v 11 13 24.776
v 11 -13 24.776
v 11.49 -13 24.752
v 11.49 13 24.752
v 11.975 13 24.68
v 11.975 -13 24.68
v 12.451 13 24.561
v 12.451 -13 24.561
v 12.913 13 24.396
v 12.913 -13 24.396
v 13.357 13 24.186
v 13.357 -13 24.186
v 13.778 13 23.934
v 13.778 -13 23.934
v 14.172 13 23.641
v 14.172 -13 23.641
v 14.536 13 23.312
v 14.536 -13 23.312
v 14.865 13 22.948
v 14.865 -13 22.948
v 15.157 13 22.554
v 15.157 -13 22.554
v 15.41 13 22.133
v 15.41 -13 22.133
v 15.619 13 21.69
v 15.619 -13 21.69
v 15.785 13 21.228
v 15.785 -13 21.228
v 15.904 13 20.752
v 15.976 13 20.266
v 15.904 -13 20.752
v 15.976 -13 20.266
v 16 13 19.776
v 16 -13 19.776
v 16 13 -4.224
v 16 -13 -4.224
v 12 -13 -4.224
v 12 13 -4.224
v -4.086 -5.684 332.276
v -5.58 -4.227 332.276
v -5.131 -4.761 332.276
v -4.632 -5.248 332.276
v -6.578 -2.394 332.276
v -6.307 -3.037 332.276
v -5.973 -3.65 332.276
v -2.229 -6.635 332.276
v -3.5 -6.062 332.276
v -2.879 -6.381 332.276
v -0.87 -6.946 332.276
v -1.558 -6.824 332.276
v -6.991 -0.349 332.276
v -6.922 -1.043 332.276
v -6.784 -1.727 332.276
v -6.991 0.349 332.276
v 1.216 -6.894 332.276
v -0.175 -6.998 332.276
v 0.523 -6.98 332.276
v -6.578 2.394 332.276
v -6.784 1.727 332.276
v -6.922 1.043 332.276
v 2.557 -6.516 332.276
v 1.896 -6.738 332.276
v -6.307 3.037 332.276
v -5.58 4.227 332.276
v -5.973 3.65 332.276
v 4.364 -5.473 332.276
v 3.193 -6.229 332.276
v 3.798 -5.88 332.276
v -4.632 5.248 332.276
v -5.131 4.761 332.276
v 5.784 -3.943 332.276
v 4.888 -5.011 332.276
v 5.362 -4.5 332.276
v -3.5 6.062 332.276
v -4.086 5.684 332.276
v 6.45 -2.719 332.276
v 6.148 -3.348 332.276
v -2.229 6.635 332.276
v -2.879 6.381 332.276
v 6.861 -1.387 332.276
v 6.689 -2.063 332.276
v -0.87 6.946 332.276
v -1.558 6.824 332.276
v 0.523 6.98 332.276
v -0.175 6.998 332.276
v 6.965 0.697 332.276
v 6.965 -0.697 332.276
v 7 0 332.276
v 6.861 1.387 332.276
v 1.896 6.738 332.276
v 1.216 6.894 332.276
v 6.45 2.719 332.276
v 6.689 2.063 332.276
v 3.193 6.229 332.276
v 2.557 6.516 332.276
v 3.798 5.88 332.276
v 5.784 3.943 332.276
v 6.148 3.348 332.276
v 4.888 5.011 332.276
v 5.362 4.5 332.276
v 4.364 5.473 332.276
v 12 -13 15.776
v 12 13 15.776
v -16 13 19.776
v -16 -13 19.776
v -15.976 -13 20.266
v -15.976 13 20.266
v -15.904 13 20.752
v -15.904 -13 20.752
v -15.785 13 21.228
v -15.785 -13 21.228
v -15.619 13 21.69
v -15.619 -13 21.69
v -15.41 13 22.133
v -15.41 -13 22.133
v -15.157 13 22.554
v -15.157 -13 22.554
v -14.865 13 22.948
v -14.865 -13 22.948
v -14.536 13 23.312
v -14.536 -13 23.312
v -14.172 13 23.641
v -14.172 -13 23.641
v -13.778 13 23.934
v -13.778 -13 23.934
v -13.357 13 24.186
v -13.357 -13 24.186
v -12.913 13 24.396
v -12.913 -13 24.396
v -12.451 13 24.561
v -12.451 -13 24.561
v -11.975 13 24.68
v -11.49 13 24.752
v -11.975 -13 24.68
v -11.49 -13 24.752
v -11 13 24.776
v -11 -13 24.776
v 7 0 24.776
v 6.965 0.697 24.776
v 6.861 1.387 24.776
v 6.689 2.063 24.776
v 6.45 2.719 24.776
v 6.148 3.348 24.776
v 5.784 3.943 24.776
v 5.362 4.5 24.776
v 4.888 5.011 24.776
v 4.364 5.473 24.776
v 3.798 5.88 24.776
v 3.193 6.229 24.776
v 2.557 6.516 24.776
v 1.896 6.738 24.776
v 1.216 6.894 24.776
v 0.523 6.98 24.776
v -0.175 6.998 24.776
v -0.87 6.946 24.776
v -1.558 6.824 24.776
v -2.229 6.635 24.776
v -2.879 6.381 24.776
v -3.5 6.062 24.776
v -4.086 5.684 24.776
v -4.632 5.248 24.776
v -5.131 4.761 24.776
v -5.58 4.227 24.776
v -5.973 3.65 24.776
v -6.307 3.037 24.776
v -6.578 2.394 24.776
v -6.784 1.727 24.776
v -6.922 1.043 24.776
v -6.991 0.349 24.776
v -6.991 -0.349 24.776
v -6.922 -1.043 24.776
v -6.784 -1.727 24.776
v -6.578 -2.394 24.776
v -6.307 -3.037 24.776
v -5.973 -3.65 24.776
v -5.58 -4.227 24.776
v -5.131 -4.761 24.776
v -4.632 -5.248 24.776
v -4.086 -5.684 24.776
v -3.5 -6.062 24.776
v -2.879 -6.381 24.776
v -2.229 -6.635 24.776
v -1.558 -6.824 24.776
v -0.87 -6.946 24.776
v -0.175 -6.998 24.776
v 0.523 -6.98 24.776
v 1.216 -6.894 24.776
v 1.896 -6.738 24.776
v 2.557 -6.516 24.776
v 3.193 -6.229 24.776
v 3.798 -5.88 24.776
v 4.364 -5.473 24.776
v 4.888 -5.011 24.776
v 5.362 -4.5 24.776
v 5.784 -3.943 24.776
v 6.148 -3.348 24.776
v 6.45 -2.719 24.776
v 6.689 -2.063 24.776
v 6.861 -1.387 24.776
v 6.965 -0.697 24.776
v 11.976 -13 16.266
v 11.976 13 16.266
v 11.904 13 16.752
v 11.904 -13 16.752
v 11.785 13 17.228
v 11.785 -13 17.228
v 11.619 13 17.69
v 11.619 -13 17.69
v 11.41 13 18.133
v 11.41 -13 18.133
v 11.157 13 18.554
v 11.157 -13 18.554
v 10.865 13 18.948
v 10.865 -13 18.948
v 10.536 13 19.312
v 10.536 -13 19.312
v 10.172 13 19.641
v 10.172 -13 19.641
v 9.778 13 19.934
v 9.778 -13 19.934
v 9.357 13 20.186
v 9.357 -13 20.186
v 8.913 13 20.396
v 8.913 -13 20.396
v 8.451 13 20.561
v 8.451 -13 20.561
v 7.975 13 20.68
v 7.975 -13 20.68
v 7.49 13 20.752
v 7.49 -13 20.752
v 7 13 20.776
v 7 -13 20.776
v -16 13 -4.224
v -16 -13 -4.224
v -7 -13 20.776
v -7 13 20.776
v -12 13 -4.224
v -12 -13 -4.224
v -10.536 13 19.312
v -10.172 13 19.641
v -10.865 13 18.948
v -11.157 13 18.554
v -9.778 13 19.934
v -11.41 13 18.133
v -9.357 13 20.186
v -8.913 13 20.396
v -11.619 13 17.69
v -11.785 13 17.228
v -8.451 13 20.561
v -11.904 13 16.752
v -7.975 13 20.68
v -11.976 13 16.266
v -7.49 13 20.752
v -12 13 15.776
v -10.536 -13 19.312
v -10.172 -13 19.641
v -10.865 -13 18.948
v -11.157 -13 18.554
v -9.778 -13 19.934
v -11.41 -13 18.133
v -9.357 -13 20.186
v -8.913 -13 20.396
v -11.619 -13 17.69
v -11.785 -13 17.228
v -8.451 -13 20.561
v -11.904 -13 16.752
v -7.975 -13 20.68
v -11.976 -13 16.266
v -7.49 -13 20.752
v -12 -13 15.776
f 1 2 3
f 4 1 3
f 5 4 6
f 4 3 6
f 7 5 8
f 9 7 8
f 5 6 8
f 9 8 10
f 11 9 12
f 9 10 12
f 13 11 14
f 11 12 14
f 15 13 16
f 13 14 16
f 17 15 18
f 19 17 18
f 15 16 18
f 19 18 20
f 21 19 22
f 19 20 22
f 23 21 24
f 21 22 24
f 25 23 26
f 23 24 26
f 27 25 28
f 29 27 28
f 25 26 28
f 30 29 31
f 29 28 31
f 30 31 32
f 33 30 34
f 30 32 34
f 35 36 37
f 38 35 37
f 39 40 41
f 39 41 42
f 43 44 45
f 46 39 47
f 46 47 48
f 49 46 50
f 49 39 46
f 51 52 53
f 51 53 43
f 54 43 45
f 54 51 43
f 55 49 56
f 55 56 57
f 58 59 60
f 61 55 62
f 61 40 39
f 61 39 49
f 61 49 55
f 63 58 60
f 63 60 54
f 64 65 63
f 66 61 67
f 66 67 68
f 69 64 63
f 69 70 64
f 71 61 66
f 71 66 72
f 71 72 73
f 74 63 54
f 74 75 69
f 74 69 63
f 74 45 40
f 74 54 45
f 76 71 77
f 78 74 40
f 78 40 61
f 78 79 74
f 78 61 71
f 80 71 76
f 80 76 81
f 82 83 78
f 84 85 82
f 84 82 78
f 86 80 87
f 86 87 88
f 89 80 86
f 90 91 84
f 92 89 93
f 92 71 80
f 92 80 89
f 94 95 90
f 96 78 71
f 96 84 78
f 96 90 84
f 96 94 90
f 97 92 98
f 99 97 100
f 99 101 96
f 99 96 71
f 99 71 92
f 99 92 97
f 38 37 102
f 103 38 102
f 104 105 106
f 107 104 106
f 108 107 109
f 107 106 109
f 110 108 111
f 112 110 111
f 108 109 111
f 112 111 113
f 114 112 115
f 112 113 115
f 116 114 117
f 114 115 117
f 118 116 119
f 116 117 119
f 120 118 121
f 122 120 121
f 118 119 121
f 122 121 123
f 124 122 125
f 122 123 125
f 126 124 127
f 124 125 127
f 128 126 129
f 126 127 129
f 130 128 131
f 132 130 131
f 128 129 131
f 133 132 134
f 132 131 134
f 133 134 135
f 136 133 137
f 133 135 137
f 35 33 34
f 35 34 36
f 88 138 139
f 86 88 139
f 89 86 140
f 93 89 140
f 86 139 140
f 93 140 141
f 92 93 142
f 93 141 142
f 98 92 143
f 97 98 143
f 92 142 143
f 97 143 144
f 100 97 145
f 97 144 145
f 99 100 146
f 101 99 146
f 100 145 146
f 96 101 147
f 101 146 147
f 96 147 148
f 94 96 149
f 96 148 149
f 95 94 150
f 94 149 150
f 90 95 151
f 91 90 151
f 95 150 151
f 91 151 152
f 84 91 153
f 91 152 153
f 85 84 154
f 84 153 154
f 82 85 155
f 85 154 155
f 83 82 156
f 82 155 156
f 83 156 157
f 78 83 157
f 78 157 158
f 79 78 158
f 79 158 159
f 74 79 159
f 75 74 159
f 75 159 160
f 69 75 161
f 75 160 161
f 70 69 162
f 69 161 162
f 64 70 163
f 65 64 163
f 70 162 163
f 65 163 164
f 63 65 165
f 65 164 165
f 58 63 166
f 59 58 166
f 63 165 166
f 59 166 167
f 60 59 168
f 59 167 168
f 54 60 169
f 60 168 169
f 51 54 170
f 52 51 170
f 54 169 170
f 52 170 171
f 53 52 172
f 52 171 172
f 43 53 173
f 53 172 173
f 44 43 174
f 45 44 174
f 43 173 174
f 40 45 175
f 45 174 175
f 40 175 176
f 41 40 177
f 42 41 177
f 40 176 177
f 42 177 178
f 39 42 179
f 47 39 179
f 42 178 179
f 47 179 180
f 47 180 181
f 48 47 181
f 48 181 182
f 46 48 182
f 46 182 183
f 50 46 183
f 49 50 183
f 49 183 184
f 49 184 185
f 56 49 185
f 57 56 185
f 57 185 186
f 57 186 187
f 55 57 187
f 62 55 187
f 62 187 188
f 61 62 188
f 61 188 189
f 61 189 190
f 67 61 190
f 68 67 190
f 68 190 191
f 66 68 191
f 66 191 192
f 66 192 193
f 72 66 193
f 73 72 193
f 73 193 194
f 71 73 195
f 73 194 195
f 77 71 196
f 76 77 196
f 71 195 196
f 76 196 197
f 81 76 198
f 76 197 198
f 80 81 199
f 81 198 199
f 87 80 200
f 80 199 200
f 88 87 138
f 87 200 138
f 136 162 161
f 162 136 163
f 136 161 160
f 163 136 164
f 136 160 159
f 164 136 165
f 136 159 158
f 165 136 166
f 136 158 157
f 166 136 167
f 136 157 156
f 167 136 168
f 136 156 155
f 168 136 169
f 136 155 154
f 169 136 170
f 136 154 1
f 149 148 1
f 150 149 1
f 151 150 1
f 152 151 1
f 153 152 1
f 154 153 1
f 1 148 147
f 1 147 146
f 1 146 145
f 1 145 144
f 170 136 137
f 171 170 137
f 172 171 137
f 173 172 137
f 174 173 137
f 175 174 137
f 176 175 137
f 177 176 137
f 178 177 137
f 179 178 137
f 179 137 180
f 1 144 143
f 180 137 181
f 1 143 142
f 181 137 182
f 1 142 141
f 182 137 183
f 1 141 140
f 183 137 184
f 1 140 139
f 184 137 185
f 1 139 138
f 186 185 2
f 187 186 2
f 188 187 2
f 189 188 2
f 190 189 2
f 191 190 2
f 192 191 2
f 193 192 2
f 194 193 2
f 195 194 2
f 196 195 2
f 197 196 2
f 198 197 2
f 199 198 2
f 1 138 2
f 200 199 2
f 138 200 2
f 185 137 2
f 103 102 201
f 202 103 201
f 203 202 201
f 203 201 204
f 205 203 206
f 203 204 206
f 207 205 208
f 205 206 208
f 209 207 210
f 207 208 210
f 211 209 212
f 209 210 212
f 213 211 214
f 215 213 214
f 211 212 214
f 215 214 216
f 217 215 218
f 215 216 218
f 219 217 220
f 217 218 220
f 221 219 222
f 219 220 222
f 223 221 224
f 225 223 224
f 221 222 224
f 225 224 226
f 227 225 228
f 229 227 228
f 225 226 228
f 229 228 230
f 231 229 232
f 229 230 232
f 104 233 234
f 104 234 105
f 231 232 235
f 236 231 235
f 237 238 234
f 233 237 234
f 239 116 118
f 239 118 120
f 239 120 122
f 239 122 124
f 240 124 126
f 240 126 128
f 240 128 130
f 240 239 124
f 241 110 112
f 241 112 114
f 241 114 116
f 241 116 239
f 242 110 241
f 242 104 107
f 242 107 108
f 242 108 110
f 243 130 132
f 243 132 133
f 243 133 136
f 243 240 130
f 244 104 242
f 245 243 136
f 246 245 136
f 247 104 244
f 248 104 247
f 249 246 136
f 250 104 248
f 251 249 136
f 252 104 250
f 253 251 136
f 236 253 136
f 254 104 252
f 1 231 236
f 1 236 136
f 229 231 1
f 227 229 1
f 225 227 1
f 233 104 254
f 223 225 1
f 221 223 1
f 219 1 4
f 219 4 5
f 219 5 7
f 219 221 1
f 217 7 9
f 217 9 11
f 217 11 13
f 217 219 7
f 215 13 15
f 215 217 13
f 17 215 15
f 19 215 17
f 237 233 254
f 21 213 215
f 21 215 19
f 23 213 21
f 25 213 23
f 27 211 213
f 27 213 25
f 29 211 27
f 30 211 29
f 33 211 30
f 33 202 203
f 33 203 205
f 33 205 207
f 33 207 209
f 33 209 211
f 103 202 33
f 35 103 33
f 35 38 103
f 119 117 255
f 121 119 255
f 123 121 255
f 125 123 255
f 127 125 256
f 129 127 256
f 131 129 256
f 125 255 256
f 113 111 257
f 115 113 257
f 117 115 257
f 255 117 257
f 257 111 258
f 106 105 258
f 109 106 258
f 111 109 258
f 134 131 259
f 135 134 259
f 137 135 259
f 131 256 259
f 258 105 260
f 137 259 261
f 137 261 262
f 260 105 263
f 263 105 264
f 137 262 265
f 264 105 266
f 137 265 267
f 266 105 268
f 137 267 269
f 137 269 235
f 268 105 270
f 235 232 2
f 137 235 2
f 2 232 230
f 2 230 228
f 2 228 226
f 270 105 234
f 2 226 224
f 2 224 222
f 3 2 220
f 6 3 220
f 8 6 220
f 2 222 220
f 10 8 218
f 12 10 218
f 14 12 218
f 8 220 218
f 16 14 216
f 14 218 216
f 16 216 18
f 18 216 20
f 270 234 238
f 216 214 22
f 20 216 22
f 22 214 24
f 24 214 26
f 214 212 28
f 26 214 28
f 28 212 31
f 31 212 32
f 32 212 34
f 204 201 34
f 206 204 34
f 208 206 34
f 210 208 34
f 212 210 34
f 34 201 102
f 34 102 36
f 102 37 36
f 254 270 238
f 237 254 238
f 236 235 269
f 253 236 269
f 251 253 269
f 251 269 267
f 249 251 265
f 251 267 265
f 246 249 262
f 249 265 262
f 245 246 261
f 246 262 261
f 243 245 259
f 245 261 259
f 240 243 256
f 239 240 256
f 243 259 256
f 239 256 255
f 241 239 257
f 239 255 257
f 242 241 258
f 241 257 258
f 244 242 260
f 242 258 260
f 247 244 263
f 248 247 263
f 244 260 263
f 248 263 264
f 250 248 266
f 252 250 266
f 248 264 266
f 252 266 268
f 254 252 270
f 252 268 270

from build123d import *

# Parameters (mm, degrees)
BOSS_EXTRUDE1_DEPTH      = 13
BOSS_EXTRUDE1_DEPTH_BACK = 13
SKETCH2_R                = 7
BOSS_EXTRUDE2_DEPTH      = 307.5


with BuildPart() as part:
    # Sketch1 → Boss-Extrude1 (new, two sides: drawn at the far end of the back side and taken through both)
    with BuildSketch(Plane(origin=(0, 0, 0), x_dir=(1, 0, 0), z_dir=(0, 1, 0)).offset(-BOSS_EXTRUDE1_DEPTH_BACK)):
        with BuildLine():
            Line((7, -20.776256957), (-7, -20.776256957))
            ThreePointArc((-7, -20.776256957), (-10.535533906, -19.311790863), (-12, -15.776256957))
            Line((-12, -15.776256957), (-12, 4.223743043))
            Line((-12, 4.223743043), (-16, 4.223743043))
            Line((-16, 4.223743043), (-16, -19.776256957))
            ThreePointArc((-16, -19.776256957), (-14.535533906, -23.311790863), (-11, -24.776256957))
            Line((-11, -24.776256957), (11, -24.776256957))
            ThreePointArc((11, -24.776256957), (14.535533906, -23.311790863), (16, -19.776256957))
            Line((16, -19.776256957), (16, 4.223743043))
            Line((16, 4.223743043), (12, 4.223743043))
            Line((12, 4.223743043), (12, -15.776256957))
            ThreePointArc((12, -15.776256957), (10.535533906, -19.311790863), (7, -20.776256957))
        make_face()
    extrude(amount=BOSS_EXTRUDE1_DEPTH + BOSS_EXTRUDE1_DEPTH_BACK)

    # Sketch2 → Boss-Extrude2 (add)
    with BuildSketch(Plane.XY.offset(24.776256957)):
        Circle(SKETCH2_R)
    extrude(amount=BOSS_EXTRUDE2_DEPTH)


solid = part.part
